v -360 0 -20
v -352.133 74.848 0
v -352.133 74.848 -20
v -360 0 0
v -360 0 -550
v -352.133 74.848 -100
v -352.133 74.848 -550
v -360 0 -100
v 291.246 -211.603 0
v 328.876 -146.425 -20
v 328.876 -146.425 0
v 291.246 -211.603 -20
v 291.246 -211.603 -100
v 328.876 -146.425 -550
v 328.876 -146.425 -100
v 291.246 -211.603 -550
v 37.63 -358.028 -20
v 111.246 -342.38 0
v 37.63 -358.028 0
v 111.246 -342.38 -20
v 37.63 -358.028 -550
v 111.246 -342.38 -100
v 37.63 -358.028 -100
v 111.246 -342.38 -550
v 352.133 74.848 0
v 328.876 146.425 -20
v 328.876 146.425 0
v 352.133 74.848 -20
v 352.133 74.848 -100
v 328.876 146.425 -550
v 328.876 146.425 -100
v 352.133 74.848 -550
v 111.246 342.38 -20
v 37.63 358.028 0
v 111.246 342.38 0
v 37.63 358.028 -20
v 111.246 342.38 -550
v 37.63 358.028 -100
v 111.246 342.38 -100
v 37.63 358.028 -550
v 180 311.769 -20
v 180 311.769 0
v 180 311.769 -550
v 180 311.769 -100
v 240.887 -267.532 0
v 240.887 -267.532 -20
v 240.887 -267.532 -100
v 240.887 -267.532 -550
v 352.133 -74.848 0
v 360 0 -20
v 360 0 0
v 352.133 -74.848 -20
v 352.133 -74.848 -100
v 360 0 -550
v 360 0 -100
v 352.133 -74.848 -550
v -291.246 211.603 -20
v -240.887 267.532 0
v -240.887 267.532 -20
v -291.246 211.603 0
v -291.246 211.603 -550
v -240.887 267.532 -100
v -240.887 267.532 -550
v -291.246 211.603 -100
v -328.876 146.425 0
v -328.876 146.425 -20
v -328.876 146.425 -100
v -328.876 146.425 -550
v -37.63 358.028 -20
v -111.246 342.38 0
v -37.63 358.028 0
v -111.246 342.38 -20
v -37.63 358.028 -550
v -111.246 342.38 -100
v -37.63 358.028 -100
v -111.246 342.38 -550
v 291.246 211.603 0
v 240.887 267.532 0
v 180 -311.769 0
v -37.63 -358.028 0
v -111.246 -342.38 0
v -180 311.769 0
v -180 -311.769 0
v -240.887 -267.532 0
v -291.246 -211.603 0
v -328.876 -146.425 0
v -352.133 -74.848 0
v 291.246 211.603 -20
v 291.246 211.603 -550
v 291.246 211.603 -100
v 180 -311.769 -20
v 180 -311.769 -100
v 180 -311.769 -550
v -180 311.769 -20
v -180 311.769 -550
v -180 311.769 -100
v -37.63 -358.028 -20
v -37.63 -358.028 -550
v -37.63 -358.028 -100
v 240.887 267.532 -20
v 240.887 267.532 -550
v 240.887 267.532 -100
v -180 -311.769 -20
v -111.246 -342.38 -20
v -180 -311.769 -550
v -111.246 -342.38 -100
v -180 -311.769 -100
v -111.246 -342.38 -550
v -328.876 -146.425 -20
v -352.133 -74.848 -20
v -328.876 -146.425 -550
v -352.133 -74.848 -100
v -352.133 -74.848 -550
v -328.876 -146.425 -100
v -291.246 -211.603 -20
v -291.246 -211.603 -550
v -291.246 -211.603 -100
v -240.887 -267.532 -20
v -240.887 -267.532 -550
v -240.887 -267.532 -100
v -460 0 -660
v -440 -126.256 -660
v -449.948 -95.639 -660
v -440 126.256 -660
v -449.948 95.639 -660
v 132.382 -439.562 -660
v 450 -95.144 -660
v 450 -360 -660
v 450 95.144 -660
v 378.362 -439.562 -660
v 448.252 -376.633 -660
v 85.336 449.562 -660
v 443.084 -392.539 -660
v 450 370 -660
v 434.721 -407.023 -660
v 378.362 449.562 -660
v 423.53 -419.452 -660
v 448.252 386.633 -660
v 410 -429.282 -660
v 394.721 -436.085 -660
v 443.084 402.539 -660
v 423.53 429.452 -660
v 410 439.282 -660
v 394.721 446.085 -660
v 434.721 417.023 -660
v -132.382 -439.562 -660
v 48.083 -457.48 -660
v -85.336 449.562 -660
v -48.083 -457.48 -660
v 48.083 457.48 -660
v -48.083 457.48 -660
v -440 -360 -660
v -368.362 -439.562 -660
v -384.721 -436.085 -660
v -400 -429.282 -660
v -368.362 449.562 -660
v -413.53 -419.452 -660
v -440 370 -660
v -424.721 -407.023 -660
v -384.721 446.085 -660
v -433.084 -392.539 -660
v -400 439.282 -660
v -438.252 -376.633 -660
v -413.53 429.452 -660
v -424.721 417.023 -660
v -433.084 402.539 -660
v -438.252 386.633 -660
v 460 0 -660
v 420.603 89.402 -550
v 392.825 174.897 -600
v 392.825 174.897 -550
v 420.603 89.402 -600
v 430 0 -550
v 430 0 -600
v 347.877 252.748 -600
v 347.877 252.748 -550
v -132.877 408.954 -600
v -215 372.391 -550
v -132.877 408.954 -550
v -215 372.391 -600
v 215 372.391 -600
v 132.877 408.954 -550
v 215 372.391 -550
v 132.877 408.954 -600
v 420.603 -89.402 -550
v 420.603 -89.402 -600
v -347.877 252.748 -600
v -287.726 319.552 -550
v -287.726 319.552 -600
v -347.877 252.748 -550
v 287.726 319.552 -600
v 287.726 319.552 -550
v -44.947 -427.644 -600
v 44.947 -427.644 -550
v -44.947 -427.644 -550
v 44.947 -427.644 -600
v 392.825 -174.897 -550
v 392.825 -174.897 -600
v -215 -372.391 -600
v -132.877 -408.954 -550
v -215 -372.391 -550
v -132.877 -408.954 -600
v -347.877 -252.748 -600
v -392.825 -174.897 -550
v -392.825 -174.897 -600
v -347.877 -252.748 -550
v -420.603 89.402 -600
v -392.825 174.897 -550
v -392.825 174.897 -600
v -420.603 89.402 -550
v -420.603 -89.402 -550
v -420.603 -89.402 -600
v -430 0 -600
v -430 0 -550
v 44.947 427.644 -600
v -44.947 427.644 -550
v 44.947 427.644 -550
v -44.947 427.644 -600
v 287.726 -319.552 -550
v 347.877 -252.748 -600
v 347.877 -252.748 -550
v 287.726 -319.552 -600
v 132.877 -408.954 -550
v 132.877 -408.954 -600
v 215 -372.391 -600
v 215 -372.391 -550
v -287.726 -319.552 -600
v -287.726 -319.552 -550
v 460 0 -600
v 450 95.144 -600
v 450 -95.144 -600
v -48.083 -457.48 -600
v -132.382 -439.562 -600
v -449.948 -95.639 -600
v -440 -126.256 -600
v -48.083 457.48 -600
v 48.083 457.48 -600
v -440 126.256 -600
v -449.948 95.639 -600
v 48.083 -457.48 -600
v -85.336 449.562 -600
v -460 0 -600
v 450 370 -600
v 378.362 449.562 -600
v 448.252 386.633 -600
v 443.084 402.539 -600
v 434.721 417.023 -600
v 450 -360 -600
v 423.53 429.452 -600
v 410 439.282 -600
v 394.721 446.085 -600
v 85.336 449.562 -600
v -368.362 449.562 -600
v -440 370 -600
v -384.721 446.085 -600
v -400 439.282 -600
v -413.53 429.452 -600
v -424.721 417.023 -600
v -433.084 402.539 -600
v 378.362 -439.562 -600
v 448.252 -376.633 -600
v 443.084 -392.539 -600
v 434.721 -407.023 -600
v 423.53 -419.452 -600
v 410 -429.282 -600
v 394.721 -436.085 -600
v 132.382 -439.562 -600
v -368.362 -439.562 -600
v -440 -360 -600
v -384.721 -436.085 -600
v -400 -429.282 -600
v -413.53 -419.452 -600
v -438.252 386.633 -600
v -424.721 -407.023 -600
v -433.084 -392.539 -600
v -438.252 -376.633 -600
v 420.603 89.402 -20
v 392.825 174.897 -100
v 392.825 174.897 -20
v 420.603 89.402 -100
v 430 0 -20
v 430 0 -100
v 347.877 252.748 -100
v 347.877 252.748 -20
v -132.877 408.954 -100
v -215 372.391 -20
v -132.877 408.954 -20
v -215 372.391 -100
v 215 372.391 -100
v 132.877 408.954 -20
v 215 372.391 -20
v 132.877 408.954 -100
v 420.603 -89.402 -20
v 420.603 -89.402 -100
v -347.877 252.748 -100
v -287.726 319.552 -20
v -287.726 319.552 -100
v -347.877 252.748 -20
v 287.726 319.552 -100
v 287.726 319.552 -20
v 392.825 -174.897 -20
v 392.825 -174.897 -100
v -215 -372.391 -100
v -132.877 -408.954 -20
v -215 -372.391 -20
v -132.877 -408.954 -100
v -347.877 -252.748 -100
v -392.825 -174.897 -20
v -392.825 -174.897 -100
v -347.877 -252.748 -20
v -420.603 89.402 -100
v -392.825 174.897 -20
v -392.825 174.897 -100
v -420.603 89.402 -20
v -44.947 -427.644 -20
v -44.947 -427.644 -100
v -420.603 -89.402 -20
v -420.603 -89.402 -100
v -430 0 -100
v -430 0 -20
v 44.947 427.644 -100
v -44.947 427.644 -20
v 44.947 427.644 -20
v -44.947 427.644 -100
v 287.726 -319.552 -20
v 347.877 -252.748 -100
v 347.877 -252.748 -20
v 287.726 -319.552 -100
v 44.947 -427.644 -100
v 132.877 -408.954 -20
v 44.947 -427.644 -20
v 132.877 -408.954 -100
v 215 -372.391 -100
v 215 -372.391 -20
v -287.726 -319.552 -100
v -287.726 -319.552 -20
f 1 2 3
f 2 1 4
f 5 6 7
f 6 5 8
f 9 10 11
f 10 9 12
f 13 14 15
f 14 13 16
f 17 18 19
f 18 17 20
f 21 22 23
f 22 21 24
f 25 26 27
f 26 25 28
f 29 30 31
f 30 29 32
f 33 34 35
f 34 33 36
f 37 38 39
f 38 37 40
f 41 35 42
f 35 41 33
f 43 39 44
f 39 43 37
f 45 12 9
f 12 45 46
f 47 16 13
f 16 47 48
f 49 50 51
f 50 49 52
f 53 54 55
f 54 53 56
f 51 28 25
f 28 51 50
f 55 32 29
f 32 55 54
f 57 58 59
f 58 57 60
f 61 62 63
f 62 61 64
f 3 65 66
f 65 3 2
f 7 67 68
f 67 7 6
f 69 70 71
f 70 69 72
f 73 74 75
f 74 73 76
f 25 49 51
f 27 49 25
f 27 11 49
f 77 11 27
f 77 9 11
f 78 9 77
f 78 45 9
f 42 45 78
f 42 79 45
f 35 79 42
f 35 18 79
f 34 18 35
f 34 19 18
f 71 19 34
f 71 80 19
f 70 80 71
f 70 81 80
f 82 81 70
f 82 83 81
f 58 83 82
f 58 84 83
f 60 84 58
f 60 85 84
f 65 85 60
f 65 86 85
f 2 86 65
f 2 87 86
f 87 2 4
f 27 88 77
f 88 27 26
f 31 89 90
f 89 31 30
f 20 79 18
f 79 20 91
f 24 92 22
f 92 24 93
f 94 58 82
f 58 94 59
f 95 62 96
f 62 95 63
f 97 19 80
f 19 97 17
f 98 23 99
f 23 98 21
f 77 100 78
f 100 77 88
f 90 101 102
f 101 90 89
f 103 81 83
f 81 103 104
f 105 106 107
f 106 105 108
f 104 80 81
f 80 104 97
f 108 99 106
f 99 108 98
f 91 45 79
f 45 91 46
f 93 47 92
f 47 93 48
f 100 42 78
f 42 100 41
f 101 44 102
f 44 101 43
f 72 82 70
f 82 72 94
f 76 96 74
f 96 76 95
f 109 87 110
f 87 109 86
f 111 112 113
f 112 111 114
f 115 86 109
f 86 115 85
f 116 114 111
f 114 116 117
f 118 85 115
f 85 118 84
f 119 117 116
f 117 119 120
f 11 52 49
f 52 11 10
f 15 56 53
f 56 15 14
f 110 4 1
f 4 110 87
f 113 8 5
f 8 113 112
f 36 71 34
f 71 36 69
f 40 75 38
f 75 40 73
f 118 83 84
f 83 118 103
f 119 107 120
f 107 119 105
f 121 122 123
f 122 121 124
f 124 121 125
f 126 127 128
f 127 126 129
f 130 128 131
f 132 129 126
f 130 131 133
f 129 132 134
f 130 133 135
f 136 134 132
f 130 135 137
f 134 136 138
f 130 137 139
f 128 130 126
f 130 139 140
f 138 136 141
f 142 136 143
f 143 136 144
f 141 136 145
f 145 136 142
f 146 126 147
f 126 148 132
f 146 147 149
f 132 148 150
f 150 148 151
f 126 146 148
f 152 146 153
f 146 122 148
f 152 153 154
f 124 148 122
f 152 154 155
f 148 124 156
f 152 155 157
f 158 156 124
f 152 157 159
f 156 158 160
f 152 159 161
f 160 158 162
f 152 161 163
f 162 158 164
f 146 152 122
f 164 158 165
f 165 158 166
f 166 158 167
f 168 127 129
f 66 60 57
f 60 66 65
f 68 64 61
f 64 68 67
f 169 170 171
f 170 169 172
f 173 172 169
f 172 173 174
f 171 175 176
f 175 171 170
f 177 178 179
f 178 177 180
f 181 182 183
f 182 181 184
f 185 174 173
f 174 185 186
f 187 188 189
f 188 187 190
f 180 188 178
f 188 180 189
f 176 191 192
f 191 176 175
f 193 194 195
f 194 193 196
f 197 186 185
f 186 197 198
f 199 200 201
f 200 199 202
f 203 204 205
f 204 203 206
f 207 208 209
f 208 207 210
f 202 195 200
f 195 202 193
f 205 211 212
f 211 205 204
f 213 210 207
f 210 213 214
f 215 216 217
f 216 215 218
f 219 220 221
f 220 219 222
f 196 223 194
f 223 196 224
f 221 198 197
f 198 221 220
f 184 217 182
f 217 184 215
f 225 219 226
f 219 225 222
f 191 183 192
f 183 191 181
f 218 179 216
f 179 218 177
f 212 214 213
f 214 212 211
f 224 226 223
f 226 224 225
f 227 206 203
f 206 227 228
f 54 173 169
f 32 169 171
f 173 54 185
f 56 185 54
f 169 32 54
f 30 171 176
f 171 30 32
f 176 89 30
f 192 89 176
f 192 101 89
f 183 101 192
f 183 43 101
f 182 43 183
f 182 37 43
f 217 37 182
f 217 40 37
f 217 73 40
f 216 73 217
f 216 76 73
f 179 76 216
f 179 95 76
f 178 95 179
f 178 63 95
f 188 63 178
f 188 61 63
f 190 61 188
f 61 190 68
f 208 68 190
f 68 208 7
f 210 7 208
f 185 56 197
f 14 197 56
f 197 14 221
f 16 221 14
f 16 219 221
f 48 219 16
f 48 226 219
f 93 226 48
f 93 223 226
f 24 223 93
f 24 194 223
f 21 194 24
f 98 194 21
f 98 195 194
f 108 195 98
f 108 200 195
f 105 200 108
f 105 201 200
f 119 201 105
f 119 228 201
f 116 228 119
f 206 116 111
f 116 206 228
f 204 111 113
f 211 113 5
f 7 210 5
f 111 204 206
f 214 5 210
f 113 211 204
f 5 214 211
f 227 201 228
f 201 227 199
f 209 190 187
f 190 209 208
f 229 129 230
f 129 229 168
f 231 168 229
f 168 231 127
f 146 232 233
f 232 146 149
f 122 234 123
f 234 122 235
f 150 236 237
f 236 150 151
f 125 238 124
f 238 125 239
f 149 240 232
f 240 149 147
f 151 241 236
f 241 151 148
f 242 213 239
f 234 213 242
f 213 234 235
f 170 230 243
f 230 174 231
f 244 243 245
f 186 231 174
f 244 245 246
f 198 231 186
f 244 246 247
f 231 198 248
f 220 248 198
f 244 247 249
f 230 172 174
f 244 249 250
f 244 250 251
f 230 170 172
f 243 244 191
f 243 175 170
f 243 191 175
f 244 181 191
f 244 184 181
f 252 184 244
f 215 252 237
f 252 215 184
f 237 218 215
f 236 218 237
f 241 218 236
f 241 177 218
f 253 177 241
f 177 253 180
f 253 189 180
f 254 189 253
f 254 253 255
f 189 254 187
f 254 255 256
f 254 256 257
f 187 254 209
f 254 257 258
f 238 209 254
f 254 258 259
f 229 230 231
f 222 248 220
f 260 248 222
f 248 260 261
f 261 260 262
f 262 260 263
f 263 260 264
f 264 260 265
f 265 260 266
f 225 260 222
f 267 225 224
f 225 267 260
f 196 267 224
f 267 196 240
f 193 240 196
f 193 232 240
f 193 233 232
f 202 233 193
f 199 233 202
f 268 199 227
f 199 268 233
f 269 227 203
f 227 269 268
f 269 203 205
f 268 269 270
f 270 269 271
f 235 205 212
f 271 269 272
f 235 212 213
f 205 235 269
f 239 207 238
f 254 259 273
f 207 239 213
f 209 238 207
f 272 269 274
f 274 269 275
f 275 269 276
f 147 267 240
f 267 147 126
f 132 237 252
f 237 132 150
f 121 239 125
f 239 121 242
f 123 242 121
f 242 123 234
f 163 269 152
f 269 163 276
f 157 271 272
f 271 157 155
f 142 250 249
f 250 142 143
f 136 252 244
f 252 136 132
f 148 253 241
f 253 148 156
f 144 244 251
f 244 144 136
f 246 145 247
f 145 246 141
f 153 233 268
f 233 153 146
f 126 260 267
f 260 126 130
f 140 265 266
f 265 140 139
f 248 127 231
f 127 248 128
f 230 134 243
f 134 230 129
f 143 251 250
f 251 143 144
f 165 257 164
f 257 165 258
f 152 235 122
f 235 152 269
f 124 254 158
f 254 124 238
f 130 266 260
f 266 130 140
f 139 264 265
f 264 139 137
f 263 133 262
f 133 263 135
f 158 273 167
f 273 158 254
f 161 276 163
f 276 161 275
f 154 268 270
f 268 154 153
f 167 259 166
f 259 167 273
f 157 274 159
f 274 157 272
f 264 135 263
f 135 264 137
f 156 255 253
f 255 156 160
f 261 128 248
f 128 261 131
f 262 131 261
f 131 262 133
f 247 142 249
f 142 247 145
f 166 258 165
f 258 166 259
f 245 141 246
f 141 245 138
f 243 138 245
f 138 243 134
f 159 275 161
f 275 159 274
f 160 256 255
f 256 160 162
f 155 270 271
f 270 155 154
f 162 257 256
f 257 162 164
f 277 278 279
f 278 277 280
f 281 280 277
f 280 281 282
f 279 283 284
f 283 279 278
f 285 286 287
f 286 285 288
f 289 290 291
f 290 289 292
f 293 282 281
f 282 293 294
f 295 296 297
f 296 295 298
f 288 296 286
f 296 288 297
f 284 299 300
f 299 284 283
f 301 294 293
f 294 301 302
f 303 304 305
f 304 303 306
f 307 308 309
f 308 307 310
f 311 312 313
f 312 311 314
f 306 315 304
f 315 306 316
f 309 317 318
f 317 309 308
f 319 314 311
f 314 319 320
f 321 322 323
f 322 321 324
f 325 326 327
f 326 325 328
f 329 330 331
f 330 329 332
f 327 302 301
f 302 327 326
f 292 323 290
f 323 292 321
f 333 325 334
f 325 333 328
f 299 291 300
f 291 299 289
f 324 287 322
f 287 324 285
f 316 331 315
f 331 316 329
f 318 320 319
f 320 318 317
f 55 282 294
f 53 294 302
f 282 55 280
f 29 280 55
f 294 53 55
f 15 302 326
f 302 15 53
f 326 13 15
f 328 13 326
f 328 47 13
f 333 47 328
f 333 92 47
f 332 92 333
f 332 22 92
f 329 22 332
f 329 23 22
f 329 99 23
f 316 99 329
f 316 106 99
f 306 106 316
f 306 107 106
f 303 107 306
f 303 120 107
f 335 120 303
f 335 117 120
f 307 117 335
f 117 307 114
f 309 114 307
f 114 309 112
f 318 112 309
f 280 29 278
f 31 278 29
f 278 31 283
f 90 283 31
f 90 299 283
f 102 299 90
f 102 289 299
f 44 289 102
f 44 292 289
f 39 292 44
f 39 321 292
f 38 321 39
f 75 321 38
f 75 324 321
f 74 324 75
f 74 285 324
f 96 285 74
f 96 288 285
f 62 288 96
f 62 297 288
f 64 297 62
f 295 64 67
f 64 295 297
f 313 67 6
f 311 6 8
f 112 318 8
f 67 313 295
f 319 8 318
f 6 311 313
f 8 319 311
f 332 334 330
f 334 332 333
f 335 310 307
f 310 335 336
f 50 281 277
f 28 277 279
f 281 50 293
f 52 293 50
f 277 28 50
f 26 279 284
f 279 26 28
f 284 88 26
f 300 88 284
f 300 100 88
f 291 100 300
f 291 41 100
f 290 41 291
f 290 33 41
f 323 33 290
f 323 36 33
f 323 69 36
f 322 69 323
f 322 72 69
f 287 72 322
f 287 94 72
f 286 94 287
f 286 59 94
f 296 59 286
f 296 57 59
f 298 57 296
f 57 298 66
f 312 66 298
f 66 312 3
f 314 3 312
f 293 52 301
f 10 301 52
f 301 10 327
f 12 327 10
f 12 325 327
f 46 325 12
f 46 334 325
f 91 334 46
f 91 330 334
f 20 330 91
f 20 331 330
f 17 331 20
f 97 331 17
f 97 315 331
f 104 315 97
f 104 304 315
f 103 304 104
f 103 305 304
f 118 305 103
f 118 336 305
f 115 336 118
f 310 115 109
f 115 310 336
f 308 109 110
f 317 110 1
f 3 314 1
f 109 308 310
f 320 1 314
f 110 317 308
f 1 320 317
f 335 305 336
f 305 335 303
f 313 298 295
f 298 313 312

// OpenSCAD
// Base del robot

union()
{
	translate([0,0,-660]) cylinder(h=660 ,r1=360, r2=360, center=false);
	translate([0,0,-660]) cylinder(h=110 ,r1=430, r2=430, center=false);
	translate([0,0,-660]) cylinder(h=60 ,r1=460, r2=460, center=false);
	translate([-360,-360,-660])  minkowski()
	{
		cube(size = [730,730,30], center = false);
		cylinder(h=30 ,r1=80, r2=80, center=false);
	}
	translate([0,0,-100]) cylinder(h=80 ,r1=430, r2=430, center=false);
}
